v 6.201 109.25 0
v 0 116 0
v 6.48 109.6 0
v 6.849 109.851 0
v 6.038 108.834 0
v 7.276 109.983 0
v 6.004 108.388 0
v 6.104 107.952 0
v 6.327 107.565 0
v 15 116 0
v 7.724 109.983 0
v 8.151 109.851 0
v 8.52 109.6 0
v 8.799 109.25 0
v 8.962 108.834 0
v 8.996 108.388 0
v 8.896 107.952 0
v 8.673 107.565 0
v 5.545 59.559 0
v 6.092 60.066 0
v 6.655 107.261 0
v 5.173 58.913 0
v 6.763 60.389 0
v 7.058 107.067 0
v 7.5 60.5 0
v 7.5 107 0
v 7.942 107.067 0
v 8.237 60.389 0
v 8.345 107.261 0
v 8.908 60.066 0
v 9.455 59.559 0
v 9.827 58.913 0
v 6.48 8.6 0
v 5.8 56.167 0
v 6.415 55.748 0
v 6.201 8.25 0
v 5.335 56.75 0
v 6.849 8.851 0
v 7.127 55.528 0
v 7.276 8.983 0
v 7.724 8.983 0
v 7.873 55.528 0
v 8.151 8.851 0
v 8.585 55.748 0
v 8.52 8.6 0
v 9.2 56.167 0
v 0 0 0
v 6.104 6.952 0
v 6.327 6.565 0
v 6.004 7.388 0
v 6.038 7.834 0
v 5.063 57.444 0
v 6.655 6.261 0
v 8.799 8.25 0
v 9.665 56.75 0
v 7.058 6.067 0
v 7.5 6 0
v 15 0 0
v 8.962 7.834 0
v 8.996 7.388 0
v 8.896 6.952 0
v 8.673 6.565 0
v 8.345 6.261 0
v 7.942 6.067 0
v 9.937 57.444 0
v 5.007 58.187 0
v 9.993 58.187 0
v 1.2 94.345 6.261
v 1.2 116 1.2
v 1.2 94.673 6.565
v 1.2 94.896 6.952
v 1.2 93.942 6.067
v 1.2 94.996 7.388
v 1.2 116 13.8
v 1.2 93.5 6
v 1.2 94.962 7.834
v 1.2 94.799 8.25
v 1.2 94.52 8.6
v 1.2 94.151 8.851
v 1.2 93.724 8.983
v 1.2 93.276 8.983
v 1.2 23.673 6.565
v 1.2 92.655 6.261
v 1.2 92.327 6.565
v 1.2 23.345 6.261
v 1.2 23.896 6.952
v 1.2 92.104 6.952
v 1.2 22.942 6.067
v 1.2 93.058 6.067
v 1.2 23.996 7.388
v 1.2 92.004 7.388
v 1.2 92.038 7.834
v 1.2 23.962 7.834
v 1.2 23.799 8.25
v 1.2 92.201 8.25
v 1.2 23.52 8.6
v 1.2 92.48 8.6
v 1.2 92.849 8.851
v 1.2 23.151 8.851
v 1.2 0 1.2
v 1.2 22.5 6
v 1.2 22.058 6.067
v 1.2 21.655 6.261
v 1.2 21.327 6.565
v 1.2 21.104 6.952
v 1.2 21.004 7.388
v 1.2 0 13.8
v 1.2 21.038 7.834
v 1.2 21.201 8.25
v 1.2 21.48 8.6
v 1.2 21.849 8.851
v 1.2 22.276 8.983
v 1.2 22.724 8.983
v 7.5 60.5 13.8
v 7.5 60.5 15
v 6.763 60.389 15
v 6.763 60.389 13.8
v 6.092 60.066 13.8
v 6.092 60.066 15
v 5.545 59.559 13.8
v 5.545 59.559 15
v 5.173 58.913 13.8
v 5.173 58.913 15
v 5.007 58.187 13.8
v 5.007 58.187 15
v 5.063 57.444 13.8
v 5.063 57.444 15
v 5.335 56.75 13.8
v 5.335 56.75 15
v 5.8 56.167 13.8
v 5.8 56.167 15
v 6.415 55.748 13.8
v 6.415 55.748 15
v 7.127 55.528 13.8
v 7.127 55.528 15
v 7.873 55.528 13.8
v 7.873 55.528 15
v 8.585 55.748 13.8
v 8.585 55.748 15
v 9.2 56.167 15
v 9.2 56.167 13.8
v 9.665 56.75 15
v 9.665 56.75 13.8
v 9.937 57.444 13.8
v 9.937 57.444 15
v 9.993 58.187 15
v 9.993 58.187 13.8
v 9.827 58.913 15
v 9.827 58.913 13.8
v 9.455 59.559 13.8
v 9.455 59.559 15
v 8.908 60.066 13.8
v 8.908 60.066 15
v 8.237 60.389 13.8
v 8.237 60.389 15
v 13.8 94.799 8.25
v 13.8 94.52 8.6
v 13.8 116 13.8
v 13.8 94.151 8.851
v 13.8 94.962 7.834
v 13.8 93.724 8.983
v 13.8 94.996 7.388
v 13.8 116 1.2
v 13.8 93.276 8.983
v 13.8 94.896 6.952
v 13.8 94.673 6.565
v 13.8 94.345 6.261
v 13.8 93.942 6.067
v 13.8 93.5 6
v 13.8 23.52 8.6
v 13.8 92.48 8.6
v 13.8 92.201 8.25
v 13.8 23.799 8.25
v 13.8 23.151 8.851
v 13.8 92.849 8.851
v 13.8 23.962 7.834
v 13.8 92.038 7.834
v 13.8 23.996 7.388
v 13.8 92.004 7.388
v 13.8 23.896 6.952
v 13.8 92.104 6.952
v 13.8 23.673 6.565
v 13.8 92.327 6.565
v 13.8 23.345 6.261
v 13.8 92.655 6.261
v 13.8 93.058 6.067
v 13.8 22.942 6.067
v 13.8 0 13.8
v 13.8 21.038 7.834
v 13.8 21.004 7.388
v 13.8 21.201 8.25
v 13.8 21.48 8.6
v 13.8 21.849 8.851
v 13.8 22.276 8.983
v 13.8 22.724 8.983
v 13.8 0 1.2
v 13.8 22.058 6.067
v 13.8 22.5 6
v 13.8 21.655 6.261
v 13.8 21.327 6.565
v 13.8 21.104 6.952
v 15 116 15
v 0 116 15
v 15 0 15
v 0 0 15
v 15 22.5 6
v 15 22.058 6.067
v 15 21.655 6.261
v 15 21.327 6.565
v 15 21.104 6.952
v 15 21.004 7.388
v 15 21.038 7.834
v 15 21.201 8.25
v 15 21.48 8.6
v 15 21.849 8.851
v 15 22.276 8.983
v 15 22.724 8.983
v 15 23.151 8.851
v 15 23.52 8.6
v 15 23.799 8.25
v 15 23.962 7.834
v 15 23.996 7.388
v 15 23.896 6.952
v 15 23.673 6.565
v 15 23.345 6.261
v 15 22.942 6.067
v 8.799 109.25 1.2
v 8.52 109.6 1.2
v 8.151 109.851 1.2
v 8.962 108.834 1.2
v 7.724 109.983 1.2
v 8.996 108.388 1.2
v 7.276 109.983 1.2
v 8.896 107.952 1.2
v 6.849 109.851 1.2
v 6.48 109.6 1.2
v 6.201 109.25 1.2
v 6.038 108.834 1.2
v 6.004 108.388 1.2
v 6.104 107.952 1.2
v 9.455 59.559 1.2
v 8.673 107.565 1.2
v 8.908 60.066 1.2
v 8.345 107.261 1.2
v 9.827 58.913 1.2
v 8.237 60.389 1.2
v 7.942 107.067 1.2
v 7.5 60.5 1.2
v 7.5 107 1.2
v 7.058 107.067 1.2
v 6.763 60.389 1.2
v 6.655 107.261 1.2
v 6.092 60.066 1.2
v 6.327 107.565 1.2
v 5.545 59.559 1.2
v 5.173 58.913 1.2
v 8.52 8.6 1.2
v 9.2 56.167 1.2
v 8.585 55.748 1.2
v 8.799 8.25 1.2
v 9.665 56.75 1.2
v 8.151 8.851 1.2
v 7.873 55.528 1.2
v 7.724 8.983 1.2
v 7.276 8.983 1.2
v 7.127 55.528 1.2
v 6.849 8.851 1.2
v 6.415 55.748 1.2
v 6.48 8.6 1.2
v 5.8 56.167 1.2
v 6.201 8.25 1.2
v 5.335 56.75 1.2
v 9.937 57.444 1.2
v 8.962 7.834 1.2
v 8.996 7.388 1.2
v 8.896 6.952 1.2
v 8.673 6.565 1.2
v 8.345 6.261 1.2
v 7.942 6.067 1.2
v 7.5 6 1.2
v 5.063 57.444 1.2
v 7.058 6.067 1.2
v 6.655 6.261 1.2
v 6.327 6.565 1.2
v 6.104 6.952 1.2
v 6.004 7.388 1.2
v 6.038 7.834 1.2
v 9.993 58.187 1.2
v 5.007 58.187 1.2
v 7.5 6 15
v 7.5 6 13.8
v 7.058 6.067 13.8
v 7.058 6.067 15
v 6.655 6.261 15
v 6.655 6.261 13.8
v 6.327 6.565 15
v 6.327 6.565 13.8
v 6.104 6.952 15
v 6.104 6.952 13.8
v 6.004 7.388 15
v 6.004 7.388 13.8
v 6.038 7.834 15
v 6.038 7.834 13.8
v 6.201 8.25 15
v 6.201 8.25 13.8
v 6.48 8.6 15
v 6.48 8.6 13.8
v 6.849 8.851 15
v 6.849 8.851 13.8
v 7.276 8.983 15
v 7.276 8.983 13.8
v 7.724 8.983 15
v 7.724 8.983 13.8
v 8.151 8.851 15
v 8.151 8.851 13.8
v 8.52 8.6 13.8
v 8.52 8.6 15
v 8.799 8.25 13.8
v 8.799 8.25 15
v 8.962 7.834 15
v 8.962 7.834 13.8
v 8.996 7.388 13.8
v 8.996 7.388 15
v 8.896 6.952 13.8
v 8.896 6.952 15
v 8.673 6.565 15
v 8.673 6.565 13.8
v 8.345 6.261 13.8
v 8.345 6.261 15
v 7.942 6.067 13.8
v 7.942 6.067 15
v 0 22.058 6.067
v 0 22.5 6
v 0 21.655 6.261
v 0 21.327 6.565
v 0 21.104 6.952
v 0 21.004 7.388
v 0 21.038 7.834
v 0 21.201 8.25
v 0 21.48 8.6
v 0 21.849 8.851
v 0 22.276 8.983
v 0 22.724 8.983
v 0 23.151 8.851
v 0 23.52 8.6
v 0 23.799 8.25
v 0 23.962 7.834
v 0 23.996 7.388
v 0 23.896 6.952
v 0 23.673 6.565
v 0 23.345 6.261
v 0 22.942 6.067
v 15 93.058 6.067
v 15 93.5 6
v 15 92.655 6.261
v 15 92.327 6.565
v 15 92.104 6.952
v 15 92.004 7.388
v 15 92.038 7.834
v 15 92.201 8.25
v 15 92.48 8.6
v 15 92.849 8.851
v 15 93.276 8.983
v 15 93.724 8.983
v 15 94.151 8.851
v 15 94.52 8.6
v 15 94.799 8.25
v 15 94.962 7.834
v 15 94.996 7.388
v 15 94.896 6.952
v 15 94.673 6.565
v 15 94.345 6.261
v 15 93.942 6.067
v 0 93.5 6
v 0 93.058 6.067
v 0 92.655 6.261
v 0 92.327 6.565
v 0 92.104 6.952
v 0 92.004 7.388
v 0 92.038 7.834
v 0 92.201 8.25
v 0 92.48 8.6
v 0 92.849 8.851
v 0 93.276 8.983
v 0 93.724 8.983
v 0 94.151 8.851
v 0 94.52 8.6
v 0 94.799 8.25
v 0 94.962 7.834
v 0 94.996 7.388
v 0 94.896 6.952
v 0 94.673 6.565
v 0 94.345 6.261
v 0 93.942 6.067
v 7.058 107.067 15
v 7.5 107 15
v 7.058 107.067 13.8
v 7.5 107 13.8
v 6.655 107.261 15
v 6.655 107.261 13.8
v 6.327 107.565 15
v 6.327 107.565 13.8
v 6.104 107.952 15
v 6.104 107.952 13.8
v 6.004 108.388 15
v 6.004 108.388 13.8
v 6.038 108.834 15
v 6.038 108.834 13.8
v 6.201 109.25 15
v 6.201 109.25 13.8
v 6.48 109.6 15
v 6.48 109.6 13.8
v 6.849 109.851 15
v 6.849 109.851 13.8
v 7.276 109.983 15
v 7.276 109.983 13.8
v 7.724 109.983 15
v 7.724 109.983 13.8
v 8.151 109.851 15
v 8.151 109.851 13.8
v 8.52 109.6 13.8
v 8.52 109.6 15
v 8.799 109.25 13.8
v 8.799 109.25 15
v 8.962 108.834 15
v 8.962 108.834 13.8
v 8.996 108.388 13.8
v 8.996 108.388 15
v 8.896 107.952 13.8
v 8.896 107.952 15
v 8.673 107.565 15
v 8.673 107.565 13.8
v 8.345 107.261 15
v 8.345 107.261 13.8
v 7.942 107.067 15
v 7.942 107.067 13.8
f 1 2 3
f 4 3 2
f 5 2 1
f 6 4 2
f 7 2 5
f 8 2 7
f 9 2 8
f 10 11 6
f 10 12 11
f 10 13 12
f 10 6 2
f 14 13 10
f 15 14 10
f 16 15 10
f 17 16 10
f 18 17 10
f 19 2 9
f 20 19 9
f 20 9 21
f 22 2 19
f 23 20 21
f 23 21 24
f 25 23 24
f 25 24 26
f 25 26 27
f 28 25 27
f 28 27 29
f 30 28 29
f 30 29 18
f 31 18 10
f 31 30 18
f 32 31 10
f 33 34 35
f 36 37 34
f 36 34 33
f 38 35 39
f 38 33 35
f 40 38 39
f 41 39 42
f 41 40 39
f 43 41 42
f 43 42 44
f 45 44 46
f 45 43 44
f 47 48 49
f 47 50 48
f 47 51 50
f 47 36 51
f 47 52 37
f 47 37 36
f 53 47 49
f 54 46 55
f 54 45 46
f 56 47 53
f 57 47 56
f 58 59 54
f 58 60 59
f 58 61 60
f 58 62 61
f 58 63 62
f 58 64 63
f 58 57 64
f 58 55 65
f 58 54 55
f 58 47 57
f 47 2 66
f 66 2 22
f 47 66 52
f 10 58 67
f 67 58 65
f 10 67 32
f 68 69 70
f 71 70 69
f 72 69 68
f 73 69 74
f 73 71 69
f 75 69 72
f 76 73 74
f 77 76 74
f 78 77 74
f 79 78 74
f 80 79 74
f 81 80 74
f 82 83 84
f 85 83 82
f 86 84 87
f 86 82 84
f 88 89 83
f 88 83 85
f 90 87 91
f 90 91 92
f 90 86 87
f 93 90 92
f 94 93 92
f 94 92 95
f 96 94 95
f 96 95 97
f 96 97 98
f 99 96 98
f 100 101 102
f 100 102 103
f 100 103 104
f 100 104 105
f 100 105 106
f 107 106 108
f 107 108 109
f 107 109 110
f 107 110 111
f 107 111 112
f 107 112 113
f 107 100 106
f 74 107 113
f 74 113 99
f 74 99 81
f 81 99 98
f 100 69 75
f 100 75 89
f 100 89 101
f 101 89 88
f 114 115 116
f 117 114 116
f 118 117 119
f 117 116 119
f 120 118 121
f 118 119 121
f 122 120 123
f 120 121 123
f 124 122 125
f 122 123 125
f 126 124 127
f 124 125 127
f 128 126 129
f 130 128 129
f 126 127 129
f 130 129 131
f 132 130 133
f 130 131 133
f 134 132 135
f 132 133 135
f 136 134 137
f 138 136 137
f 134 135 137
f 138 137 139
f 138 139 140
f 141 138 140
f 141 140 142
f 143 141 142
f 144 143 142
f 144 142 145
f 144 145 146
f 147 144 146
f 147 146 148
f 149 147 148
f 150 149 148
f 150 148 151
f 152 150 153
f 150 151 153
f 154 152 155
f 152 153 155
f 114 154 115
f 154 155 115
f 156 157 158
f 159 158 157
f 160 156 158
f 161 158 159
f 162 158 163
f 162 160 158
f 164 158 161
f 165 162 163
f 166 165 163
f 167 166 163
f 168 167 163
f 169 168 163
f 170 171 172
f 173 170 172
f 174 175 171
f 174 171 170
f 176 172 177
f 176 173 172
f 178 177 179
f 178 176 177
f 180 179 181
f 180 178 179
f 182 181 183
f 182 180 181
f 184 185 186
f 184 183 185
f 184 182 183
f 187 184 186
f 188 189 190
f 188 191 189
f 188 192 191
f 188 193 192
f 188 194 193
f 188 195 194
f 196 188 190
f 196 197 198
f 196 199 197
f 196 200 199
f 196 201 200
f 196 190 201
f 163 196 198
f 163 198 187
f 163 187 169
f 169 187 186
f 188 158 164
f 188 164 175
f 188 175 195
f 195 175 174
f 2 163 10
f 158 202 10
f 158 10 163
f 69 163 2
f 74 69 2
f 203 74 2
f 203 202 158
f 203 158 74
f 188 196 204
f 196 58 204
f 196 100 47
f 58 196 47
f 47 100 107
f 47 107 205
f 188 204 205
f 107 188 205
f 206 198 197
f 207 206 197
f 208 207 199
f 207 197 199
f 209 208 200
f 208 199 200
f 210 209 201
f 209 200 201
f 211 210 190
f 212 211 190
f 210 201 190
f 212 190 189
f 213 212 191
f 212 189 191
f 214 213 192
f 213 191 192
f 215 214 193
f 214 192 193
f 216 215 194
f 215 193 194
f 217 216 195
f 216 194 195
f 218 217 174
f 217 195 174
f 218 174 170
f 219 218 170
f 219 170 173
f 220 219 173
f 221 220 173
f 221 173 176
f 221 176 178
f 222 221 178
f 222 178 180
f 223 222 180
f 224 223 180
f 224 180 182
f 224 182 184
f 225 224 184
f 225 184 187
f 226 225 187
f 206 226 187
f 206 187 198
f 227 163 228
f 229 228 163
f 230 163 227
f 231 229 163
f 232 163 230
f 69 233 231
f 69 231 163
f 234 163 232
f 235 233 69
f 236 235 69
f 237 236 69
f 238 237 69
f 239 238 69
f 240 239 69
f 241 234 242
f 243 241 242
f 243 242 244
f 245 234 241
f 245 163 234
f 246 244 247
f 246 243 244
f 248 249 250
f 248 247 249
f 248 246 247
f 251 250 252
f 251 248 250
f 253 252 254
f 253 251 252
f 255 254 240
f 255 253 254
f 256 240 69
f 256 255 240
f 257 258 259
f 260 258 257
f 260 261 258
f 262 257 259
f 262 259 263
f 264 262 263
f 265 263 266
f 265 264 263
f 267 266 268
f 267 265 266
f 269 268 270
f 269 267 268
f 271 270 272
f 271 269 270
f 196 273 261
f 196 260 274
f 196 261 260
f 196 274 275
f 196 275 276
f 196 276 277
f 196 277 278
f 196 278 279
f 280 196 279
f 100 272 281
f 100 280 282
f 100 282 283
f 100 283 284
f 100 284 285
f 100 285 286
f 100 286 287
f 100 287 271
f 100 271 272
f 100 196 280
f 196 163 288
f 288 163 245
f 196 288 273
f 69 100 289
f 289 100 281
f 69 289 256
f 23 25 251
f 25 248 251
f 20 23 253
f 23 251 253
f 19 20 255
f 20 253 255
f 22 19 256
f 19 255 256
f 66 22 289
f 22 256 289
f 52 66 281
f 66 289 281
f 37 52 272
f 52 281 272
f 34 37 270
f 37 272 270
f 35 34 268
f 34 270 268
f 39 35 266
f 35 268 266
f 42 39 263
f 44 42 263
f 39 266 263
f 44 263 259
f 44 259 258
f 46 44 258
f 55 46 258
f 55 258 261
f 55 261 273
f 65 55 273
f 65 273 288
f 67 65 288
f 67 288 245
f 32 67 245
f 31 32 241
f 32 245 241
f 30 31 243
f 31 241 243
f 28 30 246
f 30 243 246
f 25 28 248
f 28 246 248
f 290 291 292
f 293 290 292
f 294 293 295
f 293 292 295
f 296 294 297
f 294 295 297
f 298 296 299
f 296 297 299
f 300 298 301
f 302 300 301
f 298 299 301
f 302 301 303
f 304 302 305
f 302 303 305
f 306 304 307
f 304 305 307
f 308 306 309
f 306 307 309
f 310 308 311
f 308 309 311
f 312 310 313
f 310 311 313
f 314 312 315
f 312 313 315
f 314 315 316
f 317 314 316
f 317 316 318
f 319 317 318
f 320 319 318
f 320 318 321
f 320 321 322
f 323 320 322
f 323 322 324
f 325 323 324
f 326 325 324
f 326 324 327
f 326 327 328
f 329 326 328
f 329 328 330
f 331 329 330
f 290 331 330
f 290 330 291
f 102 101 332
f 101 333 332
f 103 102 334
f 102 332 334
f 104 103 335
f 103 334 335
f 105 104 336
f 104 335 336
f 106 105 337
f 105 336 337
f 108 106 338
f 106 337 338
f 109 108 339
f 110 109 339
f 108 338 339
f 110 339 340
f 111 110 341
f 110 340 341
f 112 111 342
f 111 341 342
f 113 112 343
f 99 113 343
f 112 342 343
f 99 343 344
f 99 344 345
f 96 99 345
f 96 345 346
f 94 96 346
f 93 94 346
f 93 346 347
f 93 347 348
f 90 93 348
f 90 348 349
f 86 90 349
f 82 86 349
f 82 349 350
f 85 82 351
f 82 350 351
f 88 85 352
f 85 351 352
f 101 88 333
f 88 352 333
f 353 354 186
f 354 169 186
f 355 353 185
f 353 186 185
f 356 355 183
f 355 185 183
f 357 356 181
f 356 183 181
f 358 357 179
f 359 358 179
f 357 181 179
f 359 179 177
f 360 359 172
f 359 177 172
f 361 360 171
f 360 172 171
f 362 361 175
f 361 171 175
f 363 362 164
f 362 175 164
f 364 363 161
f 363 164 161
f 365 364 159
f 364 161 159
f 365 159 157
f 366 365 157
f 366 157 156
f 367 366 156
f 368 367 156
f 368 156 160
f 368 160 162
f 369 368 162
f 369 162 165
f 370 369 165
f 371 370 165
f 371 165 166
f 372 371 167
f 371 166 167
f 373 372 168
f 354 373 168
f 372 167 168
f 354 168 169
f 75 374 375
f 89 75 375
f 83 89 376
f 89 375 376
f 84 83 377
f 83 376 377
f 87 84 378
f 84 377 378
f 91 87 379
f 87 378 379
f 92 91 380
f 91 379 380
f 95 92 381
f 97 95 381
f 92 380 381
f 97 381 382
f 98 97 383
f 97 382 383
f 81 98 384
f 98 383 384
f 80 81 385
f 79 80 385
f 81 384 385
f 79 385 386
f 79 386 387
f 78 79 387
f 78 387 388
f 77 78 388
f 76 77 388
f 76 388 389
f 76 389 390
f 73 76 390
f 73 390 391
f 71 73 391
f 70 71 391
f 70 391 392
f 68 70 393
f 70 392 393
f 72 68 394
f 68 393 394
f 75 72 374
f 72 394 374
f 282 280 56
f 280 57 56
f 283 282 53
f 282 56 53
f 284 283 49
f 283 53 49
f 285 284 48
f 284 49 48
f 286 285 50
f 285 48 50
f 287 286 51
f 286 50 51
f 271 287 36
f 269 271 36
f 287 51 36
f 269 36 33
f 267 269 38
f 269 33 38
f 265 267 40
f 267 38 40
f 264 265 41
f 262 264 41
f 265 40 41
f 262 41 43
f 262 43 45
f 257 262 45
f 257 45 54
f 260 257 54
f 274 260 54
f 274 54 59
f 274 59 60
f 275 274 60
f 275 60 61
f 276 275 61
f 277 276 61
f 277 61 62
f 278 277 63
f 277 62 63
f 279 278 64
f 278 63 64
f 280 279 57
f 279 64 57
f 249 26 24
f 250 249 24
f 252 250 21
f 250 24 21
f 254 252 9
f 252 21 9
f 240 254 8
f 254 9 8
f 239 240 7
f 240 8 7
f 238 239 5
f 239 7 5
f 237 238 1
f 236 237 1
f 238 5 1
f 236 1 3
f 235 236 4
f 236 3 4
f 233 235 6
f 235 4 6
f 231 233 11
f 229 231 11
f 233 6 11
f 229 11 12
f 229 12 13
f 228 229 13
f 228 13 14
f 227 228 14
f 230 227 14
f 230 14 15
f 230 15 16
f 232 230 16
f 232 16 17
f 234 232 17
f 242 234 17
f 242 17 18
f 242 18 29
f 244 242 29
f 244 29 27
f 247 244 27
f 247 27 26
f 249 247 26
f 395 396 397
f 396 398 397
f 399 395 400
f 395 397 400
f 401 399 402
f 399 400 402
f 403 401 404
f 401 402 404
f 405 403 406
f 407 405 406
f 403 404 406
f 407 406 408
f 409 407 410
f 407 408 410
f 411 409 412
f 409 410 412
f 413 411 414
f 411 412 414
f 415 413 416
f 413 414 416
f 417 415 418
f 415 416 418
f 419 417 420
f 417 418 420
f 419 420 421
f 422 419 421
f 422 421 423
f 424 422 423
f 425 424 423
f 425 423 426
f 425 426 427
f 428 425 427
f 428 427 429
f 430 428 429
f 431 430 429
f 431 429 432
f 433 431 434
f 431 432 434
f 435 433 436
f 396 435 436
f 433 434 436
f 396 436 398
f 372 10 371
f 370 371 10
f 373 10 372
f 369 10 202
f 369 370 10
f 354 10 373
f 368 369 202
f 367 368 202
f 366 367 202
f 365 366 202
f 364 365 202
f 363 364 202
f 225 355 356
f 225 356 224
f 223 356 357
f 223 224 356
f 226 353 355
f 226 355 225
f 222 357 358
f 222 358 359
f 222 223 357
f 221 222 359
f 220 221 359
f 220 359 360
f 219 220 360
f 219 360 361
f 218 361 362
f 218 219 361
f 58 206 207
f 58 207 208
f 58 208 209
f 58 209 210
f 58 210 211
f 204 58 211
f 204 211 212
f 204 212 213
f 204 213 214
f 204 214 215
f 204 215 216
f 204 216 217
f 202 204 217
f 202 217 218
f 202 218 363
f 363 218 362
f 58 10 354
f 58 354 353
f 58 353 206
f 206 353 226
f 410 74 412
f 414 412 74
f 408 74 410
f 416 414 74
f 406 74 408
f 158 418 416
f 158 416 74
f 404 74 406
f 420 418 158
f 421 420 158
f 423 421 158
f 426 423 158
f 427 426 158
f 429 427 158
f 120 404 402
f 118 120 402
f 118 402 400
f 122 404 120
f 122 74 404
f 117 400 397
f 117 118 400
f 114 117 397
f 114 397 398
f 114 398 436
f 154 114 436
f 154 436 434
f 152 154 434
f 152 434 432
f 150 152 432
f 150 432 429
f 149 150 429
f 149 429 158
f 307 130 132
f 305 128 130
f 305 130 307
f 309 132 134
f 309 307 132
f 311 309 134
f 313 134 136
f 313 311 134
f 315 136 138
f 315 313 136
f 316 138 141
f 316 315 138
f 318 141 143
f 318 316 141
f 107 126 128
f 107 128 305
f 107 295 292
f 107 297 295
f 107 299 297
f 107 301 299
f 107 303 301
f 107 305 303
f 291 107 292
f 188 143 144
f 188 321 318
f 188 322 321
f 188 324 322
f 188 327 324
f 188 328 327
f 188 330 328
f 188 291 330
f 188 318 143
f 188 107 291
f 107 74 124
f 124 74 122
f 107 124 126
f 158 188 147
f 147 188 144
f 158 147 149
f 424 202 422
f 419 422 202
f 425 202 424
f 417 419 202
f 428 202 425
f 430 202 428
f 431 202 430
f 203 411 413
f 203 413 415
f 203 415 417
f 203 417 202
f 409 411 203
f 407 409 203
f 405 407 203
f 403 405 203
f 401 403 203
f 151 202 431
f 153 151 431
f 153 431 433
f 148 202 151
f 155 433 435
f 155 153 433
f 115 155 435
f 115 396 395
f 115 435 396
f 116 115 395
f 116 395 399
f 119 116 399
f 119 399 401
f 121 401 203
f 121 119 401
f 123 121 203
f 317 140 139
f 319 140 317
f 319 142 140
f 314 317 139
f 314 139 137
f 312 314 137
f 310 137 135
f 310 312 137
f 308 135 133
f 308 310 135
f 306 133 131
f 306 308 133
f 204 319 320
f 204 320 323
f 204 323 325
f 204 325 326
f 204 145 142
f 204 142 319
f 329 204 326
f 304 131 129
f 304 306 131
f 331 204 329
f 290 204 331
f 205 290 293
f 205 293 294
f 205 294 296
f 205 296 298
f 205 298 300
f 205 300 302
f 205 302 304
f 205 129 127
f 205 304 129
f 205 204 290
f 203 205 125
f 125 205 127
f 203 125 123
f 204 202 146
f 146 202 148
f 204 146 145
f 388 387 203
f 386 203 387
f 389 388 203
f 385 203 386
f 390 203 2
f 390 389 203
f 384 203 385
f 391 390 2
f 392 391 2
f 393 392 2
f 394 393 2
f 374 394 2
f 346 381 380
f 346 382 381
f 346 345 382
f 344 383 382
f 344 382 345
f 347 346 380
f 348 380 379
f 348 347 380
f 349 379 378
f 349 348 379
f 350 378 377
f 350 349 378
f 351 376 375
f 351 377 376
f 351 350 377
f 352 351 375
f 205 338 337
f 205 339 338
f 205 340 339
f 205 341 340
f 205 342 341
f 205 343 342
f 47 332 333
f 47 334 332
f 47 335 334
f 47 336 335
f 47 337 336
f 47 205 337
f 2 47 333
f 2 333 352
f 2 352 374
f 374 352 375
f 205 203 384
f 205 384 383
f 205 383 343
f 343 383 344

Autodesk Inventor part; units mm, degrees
ref_plane "YZ Plane" through (0, 0, 0) normal (1, 0, 0) x (0, 1, 0)
ref_plane "XZ Plane" through (0, 0, 0) normal (0, 1, 0) x (-1, 0, 0)
ref_plane "XY Plane" through (0, 0, 0) normal (0, 0, 1) x (1, 0, 0)
sketch "スケッチ1" plane through (0, 0, 0) normal (0, 1, 0) x (-1, 0, 0)
  line L0 (0, 0) -> (-15, 0)
  line L1 (-15, 0) -> (-15, 15)
  line L2 (-15, 15) -> (0, 15)
  line L3 (0, 15) -> (0, 0)
  line L4 (-1.2, 13.8) -> (-13.8, 13.8)
  line L5 (-13.8, 13.8) -> (-13.8, 1.2)
  line L6 (-13.8, 1.2) -> (-1.2, 1.2)
  line L7 (-1.2, 1.2) -> (-1.2, 13.8)
  dimension "d0" = 15
  dimension "d1" = 15
  dimension "d2" = 1.2
  dimension "d3" = 1.2
  dimension "d4" = 1.2
  dimension "d5" = 1.2
extrude "押し出し1" add sketch "スケッチ1" along normal blind 116
sketch "スケッチ2" plane through (0, 0, 15) normal (0, 0, 1) x (1, 0, 0)
  line L0 (0, 116) -> (15, 116) projected
  line L1 (0, 0) -> (15, 0) projected
  line L2 (15, 0) -> (15, 116) projected
  point P0 (7.5, 108.5)
  point P1 (7.5, 7.5)
  dimension "d8" = 7.5
  dimension "d9" = 7.5
  dimension "d10" = 7.5
  dimension "d11" = 7.5
hole "穴1" at (7.5, 108.5, 15) at (7.5, 7.5, 15) direction (0, 0, -1) diameter 3 end through all
sketch "スケッチ3" plane through (15, 0, 15) normal (1, 0, 0) x (0, 0, -1)
  line L0 (0, 0) -> (15, 0) projected
  line L1 (0, 0) -> (0, 116) projected
  line L2 (0, 116) -> (15, 116) projected
  point P0 (7.5, 22.5)
  point P1 (7.5, 93.5)
  dimension "d19" = 22.5
  dimension "d20" = 7.5
  dimension "d21" = 7.5
  dimension "d22" = 22.5
hole "穴2" at (15, 22.5, 7.5) at (15, 93.5, 7.5) direction (-1, 0, 0) diameter 3 end through all
sketch "スケッチ4" plane through (15, 0, 0) normal (0, 0, -1) x (-1, 0, 0)
  line L0 (0, 116) -> (15, 116) projected
  line L1 (0, 0) -> (15, 0) projected
  line L2 (0, 0) -> (0, 116) projected
  point P0 (7.5, 58)
  dimension "d30" = 116
  dimension "d31" = 58
  dimension "d32" = 7.5
hole "穴3" at (7.5, 58, 0) direction (0, 0, 1) diameter 5 end through all
equation "\"d3\" = d2"
equation "\"d4\" = d2"
equation "\"d5\" = d2"
equation "\"d9\" = d8"
equation "\"d10\" = d8"
equation "\"d11\" = d9"
equation "\"d31\" = 0.5 * d30"
properties part number "ロボットベース15x15_4" material "アルミニウム 6061"
